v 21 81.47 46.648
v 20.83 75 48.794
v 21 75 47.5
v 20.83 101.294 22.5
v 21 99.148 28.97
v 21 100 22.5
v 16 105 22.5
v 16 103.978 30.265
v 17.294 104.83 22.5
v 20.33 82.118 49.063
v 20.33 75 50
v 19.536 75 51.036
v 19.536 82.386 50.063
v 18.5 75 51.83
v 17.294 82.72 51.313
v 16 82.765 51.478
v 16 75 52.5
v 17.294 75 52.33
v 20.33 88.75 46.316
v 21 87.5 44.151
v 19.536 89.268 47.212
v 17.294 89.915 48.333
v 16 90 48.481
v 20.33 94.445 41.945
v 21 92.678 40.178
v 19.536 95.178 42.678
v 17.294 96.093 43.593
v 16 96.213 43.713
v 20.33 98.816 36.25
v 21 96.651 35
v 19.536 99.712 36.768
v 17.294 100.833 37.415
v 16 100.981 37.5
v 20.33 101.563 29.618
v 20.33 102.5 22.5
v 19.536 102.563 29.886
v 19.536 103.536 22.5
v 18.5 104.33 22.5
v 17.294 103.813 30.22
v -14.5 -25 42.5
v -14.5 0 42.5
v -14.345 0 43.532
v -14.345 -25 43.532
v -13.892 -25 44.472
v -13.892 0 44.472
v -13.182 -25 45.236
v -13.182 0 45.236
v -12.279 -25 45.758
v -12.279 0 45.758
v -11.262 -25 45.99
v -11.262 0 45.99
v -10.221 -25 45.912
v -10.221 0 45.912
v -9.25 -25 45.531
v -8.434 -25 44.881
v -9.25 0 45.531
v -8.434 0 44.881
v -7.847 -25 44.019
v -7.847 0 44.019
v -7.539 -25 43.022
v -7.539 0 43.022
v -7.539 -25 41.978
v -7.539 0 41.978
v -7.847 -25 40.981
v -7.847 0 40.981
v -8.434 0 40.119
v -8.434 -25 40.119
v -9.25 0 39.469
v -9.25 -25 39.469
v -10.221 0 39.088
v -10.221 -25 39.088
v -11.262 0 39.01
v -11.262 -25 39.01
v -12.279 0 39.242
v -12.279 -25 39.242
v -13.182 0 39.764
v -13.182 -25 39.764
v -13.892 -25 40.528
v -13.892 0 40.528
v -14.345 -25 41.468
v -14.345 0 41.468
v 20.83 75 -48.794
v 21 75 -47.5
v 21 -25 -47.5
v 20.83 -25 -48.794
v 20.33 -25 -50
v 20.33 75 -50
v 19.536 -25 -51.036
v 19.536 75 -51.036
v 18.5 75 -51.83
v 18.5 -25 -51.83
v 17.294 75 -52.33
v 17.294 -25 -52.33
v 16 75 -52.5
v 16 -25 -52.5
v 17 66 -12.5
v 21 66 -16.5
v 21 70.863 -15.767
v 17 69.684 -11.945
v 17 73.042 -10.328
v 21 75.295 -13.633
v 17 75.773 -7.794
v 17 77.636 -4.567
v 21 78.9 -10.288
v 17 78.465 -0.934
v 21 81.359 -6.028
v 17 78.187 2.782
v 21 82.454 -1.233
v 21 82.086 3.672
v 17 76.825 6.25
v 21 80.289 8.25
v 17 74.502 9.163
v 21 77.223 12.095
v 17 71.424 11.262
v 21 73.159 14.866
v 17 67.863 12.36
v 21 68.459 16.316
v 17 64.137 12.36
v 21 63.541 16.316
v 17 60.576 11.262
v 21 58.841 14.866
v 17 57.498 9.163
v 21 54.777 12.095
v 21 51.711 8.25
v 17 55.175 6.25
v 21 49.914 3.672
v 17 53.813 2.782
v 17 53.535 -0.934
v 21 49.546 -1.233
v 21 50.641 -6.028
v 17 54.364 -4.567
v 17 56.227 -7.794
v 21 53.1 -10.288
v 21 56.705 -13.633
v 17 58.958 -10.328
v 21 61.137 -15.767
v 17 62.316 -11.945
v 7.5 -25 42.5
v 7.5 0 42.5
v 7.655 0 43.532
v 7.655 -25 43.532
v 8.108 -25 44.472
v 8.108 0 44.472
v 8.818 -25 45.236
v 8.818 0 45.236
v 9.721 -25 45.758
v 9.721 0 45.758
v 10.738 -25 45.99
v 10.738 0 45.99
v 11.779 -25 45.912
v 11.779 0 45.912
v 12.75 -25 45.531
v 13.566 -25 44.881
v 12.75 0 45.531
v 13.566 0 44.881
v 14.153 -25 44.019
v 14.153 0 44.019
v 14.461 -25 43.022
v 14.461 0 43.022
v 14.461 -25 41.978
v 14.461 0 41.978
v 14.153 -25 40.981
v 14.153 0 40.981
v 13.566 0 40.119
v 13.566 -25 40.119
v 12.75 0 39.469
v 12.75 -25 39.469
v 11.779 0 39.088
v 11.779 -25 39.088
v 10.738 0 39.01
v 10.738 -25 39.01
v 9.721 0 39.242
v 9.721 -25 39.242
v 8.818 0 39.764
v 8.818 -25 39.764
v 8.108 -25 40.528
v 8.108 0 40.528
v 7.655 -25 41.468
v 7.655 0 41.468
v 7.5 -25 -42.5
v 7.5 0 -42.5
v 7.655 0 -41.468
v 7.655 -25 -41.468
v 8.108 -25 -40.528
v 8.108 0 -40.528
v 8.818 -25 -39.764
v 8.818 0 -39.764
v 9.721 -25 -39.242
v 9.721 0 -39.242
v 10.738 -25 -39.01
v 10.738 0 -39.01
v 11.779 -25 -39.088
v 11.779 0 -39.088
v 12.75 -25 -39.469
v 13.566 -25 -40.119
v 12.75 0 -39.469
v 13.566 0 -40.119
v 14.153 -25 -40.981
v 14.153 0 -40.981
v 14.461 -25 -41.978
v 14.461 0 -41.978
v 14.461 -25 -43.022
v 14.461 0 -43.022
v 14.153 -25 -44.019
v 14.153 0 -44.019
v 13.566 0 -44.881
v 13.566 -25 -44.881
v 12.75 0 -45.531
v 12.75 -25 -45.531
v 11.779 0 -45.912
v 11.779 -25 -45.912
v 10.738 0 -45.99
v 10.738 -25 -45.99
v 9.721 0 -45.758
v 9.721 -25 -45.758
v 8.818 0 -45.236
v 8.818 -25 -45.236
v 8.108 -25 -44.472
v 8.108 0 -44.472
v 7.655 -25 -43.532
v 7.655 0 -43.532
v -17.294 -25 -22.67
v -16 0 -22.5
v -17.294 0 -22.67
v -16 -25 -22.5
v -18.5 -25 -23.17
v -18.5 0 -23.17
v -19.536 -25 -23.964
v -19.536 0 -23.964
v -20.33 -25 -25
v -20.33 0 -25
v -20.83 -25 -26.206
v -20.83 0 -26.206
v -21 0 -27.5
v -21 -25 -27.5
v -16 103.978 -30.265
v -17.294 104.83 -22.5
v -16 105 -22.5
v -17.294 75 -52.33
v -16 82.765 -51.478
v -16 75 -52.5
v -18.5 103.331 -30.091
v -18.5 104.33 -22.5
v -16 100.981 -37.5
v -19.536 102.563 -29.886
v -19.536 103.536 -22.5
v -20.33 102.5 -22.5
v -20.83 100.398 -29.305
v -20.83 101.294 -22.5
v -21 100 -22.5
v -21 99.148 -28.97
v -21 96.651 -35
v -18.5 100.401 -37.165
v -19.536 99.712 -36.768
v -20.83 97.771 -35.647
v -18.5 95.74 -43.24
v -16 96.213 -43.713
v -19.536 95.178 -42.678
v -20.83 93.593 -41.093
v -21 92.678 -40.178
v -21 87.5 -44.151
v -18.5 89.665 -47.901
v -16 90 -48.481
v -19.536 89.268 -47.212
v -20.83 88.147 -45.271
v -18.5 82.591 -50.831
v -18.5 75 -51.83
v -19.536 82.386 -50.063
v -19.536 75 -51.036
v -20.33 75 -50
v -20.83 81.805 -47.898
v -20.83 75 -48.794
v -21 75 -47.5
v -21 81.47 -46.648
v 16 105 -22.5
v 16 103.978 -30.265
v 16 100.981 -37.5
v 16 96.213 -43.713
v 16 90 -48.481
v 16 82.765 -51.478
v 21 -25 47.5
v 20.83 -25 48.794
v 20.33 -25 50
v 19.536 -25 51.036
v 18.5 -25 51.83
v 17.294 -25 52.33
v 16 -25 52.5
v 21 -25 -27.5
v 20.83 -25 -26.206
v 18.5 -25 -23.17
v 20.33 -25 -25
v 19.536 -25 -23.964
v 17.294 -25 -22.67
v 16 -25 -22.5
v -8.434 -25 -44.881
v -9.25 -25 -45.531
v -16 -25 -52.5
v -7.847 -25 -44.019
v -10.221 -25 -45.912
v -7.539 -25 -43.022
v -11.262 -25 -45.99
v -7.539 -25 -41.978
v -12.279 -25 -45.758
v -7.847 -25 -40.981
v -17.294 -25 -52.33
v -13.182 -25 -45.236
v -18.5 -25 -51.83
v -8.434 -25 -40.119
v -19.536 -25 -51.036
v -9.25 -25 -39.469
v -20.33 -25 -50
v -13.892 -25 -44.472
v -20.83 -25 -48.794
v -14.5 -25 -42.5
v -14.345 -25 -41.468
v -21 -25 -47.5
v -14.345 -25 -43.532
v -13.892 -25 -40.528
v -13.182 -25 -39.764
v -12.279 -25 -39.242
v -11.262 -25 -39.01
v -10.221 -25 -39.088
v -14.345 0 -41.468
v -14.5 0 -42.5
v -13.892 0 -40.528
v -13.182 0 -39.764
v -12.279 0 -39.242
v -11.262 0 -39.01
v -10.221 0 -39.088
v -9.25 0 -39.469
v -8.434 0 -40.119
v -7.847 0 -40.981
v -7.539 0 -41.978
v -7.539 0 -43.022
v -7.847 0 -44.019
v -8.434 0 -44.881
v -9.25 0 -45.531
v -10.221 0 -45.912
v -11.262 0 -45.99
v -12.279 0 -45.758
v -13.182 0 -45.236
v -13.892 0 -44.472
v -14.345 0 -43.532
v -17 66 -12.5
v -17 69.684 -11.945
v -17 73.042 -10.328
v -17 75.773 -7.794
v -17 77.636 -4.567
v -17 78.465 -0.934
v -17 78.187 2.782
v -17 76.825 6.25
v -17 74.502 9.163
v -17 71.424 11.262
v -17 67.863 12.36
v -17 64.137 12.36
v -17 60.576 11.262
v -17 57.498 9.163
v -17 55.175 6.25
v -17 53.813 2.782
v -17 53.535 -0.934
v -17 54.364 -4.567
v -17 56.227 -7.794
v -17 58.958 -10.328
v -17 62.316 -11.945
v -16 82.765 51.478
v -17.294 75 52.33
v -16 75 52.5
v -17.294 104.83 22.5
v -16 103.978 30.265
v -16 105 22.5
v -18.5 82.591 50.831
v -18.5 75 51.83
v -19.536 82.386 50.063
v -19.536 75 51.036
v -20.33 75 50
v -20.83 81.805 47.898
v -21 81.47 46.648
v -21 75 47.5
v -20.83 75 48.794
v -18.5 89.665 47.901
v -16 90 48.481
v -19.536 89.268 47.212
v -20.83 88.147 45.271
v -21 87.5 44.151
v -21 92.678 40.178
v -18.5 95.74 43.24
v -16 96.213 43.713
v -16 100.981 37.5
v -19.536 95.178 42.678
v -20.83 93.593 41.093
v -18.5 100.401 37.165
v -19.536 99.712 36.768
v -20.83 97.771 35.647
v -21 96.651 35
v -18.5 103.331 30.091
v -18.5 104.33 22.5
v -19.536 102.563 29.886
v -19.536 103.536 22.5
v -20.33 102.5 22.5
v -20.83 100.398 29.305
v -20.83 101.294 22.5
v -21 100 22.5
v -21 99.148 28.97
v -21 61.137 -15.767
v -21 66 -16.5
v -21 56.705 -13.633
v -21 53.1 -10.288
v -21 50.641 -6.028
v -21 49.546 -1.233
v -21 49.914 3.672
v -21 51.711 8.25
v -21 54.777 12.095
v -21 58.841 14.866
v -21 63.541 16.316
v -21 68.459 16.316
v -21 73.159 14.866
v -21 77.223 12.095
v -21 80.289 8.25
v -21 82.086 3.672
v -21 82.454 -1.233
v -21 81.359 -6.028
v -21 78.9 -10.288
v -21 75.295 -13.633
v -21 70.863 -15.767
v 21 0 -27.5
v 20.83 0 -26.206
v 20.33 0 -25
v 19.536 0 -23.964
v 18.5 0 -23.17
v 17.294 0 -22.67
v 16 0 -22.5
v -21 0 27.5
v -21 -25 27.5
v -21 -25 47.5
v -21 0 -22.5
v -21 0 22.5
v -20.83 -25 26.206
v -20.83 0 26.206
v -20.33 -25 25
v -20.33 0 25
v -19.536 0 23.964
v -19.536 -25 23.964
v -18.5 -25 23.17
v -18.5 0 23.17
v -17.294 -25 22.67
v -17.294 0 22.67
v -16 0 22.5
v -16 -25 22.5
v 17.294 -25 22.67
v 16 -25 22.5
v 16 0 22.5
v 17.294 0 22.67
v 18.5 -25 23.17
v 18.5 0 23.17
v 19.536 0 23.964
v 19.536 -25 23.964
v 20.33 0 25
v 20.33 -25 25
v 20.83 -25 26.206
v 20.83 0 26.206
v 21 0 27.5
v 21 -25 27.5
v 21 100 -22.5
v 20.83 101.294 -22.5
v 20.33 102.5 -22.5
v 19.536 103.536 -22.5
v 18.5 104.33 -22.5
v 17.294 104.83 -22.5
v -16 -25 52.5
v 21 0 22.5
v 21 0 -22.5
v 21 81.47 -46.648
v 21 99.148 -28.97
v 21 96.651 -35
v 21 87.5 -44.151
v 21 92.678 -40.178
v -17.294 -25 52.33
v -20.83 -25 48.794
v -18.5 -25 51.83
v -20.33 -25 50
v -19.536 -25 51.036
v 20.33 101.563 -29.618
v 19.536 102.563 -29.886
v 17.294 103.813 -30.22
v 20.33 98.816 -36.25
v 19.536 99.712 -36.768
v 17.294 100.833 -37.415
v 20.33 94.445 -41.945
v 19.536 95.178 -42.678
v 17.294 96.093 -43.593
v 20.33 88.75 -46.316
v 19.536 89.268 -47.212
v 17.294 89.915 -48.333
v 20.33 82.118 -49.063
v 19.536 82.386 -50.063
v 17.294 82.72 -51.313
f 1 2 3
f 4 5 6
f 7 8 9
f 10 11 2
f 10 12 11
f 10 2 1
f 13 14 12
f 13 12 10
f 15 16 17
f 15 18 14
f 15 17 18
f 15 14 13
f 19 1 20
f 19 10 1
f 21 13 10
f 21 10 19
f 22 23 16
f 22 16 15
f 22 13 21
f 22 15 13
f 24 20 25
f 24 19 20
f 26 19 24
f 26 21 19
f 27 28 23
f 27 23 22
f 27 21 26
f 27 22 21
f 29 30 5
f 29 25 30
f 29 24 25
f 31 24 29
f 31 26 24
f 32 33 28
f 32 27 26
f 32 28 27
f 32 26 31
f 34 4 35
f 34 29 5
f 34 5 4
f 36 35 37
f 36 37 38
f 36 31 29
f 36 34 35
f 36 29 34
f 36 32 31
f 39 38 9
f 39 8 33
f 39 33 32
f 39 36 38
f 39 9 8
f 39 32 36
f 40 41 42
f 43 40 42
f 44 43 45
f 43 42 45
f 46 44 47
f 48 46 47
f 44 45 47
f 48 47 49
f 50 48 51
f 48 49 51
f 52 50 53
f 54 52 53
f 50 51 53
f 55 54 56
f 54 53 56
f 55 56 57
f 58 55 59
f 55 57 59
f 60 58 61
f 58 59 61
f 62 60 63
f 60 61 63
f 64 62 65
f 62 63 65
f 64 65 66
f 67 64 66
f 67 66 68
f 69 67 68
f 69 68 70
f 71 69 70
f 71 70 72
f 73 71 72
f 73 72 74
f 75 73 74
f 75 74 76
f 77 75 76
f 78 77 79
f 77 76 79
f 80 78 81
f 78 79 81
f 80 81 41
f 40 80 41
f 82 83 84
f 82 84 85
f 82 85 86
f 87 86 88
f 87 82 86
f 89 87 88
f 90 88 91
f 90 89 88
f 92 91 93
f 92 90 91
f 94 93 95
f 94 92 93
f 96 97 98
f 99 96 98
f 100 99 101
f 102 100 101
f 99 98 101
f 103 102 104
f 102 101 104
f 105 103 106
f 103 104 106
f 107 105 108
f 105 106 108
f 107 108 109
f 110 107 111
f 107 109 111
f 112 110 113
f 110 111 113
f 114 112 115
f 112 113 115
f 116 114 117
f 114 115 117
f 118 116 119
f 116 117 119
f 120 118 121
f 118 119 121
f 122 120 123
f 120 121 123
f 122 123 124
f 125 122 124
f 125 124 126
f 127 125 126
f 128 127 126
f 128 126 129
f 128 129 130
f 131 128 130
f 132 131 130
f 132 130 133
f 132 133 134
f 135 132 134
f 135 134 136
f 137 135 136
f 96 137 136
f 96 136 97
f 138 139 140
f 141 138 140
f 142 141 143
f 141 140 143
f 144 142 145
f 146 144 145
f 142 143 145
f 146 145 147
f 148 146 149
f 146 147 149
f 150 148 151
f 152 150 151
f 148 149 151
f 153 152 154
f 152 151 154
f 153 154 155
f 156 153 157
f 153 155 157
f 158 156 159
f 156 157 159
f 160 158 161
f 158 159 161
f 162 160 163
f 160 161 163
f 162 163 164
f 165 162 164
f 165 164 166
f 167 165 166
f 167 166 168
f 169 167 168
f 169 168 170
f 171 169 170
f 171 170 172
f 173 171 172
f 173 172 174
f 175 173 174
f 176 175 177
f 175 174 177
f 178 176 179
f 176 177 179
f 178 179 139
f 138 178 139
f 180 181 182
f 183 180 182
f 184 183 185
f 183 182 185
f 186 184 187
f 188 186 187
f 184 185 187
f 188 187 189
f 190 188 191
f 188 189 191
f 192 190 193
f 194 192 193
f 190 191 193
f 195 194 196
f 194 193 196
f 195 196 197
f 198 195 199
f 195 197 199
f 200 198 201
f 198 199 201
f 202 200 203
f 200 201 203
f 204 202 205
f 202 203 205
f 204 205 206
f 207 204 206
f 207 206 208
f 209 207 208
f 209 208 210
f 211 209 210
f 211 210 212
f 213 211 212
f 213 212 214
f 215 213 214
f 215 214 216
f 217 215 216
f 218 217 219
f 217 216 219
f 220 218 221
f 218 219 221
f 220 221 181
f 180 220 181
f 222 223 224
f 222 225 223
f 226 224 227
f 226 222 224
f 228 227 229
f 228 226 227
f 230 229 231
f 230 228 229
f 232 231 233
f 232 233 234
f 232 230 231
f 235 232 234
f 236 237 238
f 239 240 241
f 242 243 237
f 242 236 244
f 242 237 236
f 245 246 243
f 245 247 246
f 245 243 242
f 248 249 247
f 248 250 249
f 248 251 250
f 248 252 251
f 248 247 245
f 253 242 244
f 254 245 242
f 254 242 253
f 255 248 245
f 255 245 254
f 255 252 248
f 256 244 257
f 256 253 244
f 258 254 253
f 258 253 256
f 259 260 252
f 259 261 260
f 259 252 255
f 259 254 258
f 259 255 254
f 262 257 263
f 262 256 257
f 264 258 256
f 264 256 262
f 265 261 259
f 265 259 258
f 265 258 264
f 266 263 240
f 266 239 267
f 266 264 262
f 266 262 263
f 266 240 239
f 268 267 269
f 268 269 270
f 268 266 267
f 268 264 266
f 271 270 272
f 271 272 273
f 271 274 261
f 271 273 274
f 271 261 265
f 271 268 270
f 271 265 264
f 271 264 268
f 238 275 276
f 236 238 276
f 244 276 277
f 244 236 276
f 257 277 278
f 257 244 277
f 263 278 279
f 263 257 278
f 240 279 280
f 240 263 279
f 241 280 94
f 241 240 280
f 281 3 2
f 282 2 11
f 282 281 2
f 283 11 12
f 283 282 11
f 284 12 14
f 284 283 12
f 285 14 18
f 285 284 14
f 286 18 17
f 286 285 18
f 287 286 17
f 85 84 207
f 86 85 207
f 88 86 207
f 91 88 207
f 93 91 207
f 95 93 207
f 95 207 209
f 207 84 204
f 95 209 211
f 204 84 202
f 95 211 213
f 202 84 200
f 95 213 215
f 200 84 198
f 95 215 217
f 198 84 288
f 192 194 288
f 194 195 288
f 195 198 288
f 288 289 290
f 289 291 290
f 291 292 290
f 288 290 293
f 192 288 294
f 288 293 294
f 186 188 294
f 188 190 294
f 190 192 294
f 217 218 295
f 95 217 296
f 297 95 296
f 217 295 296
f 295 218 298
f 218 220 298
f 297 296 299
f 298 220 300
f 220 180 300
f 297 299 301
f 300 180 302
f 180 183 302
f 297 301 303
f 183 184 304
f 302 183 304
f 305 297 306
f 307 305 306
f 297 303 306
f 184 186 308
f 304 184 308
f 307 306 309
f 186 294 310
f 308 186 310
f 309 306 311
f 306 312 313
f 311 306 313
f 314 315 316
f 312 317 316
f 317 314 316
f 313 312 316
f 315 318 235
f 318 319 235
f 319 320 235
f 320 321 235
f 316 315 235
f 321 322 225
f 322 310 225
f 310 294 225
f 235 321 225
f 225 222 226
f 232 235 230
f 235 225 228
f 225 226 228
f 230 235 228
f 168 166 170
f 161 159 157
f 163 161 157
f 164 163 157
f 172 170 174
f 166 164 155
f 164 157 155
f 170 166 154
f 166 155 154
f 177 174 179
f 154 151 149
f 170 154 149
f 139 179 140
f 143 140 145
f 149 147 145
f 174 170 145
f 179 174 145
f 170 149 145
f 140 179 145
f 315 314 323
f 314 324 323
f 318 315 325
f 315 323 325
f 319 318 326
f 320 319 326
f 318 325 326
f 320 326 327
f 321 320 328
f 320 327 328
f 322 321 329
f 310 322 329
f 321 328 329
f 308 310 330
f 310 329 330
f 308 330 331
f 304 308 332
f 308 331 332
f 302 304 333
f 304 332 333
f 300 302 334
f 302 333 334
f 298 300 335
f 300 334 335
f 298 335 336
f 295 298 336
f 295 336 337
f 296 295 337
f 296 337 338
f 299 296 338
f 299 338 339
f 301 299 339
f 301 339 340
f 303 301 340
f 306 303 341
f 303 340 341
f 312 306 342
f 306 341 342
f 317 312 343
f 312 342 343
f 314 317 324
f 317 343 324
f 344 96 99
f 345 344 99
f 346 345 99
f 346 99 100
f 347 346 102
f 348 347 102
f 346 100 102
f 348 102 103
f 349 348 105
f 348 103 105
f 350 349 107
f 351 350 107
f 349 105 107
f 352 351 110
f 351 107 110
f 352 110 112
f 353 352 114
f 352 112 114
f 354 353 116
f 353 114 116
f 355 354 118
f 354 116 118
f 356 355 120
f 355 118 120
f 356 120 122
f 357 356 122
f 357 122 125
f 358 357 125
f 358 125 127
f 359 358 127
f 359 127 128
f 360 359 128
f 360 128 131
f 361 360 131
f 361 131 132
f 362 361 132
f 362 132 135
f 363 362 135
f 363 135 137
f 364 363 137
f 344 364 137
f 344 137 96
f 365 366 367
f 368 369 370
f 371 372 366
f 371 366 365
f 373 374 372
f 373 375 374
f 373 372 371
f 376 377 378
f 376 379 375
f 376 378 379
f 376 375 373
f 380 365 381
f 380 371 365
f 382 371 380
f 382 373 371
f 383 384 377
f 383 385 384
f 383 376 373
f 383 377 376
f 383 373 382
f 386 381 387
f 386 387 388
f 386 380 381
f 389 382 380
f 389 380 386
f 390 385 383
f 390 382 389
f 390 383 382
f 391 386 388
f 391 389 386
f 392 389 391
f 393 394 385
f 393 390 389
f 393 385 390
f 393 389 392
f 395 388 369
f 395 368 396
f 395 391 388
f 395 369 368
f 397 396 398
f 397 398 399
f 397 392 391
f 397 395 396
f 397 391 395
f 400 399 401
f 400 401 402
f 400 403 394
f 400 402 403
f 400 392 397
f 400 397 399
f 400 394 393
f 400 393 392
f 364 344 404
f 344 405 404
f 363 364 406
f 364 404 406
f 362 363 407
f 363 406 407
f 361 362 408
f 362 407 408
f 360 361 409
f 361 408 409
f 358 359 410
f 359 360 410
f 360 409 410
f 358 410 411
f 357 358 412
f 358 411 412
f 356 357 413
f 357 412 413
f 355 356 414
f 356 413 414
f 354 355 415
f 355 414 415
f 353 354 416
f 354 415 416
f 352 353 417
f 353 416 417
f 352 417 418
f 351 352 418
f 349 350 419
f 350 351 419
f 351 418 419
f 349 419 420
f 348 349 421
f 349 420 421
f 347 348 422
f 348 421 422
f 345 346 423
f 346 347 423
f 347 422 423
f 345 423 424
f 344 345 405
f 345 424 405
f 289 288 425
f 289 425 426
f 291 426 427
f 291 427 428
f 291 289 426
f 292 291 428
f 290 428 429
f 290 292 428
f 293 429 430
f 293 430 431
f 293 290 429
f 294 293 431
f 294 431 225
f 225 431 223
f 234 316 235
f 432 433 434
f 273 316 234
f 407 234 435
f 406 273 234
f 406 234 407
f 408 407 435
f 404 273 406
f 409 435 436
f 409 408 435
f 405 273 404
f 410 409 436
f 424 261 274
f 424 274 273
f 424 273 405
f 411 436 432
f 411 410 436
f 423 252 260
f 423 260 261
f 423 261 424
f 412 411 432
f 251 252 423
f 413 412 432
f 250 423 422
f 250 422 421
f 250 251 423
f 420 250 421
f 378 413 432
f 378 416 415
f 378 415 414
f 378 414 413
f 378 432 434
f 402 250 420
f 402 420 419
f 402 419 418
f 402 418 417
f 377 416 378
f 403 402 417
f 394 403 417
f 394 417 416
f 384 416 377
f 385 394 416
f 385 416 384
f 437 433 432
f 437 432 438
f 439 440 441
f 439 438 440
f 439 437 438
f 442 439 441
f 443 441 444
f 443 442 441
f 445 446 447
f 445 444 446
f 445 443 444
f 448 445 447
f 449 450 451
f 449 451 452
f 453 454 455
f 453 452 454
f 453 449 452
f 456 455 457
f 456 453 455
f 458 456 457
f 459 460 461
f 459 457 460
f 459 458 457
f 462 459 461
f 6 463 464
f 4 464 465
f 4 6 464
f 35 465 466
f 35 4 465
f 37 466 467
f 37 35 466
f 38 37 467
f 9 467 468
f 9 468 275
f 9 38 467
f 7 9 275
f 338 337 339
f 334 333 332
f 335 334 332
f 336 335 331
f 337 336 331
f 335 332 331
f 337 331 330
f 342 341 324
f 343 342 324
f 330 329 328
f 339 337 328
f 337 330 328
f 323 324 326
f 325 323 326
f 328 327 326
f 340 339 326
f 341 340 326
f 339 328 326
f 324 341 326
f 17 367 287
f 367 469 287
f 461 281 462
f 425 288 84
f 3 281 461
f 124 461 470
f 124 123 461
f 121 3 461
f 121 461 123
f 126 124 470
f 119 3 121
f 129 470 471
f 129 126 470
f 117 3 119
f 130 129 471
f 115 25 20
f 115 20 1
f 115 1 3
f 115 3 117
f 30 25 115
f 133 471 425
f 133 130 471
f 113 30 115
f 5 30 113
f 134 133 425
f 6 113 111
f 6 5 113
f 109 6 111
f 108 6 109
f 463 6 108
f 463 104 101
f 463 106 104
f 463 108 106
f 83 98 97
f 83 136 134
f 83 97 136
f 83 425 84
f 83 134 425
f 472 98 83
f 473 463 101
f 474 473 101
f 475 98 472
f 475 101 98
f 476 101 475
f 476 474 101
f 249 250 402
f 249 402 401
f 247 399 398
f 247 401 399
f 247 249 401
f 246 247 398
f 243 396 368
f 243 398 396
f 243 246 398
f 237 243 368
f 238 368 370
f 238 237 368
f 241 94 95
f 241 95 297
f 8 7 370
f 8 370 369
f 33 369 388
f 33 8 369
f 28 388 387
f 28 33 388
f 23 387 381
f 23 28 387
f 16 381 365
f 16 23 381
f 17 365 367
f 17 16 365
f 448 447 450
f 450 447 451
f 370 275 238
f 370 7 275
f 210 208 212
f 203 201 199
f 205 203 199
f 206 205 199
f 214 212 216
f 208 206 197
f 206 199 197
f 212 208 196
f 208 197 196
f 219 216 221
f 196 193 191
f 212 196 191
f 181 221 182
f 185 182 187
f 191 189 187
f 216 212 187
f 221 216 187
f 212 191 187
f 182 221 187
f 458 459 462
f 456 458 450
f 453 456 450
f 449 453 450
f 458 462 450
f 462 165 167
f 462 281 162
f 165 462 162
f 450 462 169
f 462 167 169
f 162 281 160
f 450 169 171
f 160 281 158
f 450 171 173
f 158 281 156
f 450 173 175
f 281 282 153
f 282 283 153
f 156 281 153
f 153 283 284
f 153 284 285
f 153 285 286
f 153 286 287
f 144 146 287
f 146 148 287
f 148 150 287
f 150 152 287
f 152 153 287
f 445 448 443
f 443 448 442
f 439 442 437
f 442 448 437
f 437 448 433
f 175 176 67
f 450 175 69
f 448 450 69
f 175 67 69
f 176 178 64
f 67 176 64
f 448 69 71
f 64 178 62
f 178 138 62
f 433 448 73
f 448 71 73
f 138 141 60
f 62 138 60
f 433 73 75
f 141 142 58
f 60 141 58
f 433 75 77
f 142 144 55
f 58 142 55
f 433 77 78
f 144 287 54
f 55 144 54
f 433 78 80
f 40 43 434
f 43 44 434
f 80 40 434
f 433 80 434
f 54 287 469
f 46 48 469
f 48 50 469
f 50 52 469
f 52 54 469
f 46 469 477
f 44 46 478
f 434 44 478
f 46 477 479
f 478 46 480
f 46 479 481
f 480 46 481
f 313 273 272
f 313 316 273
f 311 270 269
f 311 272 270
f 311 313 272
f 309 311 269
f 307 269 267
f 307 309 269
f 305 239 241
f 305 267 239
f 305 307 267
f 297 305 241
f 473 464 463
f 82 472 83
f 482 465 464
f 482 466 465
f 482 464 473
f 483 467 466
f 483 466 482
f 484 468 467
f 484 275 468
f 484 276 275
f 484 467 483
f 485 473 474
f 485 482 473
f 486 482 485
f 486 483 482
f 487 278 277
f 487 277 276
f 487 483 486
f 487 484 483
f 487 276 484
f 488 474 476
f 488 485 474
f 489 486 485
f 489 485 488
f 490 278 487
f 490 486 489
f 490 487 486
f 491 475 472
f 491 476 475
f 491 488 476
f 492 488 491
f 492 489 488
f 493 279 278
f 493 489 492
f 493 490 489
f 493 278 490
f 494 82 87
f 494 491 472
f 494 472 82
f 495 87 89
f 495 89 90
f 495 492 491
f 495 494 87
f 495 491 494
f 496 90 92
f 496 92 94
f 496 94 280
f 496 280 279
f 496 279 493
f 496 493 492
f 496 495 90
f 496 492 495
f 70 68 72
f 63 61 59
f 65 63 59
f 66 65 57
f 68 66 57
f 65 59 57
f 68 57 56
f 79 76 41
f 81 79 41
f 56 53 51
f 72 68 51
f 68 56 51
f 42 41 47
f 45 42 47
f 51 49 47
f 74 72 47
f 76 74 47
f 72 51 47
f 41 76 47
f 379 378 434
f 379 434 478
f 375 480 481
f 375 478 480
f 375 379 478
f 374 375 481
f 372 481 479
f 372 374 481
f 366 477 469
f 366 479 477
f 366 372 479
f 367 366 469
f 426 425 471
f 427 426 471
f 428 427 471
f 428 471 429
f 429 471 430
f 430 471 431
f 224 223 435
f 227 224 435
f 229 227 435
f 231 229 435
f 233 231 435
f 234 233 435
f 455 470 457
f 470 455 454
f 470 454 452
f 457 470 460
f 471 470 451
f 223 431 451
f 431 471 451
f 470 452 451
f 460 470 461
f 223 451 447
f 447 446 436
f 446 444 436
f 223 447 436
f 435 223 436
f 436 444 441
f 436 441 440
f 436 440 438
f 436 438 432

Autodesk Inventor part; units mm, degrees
ref_plane "YZ Plane" through (0, 0, 0) normal (1, 0, 0) x (0, 1, 0)
ref_plane "XZ Plane" through (0, 0, 0) normal (0, 1, 0) x (-1, 0, 0)
ref_plane "XY Plane" through (0, 0, 0) normal (0, 0, 1) x (1, 0, 0)
sketch "Sketch1" plane through (0, 0, 0) normal (0, 1, 0) x (-1, 0, 0)
  line L0 (-21, -52.5) -> (21, -52.5)
  line L1 (21, -52.5) -> (21, 52.5)
  line L2 (21, 52.5) -> (-21, 52.5)
  line L3 (-21, 52.5) -> (-21, -52.5)
  line L4 (-21, -52.5) -> (21, 52.5) construction
  line L5 (21, -52.5) -> (-21, 52.5) construction
  line L6 (-11, -42.5) -> (11, -42.5) construction
  line L7 (11, -42.5) -> (11, 42.5) construction
  line L8 (11, 42.5) -> (-11, 42.5) construction
  line L9 (-11, 42.5) -> (-11, -42.5) construction
  line L10 (-11, -42.5) -> (11, 42.5) construction
  line L11 (11, -42.5) -> (-11, 42.5) construction
  line L12 (-21, -22.5) -> (21, -22.5)
  line L13 (21, -22.5) -> (21, 22.5)
  line L14 (21, 22.5) -> (-21, 22.5)
  line L15 (-21, 22.5) -> (-21, -22.5)
  line L16 (-21, -22.5) -> (21, 22.5) construction
  line L17 (21, -22.5) -> (-21, 22.5) construction
  circle A0 centre (11, 42.5) radius 3.5
  circle A1 centre (-11, 42.5) radius 3.5
  circle A2 centre (11, -42.5) radius 3.5
  circle A3 centre (-11, -42.5) radius 3.5
  point P0 (0, 0)
  dimension "d0" = 22
  dimension "d1" = 85
  dimension "d2" = 10
  dimension "d3" = 10
  dimension "d4" = 45
  dimension "d5" = 7
  dimension "d6" = 7
  dimension "d8" = 7
  dimension "d9" = 7
extrude "Extrusion1" add sketch "Sketch1" against normal blind 25 contours L3 L12 L1 L0 | L3 L2 L1 L14
extrude "Extrusion2" add sketch "Sketch1" along normal blind 105 contours L3 L12 L1 L0 | L3 L14 L1 L12 | L3 L2 L1 L14 | A0 | A1 | A2 | A3
sketch "Sketch2" plane through (21, -25, -22.5) normal (1, 0, 0) x (0, 0, -1)
  circle A0 centre (-22.5, 91) radius 12.5
  line L0 (-45, 0) -> (-75, 0) projected
  line L1 (-22.5, 25) -> (-22.5, 91) construction
  dimension "d14" = 25
  dimension "d15" = 91
extrude "Extrusion3" cut sketch "Sketch2" against normal through all
fillet "Fillet1" radius 30 2 edges at (0, 105, 52.5) (0, 105, -52.5)
fillet "Fillet2" radius 5 14 edges at (21, 96.2132, 43.7132) (21, 105, 0) (21, 96.2132, -43.7132) (21, 25, -52.5) (21, 25, 52.5) (-21, 25, 52.5) (-21, 105, 0) (-21, 96.2132, -43.7132) (-21, 25, -52.5) (-21, 96.2132, 43.7132) (21, -12.5, 22.5) (21, -12.5, -22.5) (-21, -12.5, -22.5) (-21, -12.5, 22.5)
chamfer "Chamfer1" distance 4 angle 45 2 edges at (21, 66, 12.5) (-21, 66, 12.5)
equation "\"d3\" = d2"
equation "\"d6\" = d5"
equation "\"d8\" = d5"
equation "\"d9\" = d5"
properties part number "BALL SCREW MIDDLE SUPPORT"
